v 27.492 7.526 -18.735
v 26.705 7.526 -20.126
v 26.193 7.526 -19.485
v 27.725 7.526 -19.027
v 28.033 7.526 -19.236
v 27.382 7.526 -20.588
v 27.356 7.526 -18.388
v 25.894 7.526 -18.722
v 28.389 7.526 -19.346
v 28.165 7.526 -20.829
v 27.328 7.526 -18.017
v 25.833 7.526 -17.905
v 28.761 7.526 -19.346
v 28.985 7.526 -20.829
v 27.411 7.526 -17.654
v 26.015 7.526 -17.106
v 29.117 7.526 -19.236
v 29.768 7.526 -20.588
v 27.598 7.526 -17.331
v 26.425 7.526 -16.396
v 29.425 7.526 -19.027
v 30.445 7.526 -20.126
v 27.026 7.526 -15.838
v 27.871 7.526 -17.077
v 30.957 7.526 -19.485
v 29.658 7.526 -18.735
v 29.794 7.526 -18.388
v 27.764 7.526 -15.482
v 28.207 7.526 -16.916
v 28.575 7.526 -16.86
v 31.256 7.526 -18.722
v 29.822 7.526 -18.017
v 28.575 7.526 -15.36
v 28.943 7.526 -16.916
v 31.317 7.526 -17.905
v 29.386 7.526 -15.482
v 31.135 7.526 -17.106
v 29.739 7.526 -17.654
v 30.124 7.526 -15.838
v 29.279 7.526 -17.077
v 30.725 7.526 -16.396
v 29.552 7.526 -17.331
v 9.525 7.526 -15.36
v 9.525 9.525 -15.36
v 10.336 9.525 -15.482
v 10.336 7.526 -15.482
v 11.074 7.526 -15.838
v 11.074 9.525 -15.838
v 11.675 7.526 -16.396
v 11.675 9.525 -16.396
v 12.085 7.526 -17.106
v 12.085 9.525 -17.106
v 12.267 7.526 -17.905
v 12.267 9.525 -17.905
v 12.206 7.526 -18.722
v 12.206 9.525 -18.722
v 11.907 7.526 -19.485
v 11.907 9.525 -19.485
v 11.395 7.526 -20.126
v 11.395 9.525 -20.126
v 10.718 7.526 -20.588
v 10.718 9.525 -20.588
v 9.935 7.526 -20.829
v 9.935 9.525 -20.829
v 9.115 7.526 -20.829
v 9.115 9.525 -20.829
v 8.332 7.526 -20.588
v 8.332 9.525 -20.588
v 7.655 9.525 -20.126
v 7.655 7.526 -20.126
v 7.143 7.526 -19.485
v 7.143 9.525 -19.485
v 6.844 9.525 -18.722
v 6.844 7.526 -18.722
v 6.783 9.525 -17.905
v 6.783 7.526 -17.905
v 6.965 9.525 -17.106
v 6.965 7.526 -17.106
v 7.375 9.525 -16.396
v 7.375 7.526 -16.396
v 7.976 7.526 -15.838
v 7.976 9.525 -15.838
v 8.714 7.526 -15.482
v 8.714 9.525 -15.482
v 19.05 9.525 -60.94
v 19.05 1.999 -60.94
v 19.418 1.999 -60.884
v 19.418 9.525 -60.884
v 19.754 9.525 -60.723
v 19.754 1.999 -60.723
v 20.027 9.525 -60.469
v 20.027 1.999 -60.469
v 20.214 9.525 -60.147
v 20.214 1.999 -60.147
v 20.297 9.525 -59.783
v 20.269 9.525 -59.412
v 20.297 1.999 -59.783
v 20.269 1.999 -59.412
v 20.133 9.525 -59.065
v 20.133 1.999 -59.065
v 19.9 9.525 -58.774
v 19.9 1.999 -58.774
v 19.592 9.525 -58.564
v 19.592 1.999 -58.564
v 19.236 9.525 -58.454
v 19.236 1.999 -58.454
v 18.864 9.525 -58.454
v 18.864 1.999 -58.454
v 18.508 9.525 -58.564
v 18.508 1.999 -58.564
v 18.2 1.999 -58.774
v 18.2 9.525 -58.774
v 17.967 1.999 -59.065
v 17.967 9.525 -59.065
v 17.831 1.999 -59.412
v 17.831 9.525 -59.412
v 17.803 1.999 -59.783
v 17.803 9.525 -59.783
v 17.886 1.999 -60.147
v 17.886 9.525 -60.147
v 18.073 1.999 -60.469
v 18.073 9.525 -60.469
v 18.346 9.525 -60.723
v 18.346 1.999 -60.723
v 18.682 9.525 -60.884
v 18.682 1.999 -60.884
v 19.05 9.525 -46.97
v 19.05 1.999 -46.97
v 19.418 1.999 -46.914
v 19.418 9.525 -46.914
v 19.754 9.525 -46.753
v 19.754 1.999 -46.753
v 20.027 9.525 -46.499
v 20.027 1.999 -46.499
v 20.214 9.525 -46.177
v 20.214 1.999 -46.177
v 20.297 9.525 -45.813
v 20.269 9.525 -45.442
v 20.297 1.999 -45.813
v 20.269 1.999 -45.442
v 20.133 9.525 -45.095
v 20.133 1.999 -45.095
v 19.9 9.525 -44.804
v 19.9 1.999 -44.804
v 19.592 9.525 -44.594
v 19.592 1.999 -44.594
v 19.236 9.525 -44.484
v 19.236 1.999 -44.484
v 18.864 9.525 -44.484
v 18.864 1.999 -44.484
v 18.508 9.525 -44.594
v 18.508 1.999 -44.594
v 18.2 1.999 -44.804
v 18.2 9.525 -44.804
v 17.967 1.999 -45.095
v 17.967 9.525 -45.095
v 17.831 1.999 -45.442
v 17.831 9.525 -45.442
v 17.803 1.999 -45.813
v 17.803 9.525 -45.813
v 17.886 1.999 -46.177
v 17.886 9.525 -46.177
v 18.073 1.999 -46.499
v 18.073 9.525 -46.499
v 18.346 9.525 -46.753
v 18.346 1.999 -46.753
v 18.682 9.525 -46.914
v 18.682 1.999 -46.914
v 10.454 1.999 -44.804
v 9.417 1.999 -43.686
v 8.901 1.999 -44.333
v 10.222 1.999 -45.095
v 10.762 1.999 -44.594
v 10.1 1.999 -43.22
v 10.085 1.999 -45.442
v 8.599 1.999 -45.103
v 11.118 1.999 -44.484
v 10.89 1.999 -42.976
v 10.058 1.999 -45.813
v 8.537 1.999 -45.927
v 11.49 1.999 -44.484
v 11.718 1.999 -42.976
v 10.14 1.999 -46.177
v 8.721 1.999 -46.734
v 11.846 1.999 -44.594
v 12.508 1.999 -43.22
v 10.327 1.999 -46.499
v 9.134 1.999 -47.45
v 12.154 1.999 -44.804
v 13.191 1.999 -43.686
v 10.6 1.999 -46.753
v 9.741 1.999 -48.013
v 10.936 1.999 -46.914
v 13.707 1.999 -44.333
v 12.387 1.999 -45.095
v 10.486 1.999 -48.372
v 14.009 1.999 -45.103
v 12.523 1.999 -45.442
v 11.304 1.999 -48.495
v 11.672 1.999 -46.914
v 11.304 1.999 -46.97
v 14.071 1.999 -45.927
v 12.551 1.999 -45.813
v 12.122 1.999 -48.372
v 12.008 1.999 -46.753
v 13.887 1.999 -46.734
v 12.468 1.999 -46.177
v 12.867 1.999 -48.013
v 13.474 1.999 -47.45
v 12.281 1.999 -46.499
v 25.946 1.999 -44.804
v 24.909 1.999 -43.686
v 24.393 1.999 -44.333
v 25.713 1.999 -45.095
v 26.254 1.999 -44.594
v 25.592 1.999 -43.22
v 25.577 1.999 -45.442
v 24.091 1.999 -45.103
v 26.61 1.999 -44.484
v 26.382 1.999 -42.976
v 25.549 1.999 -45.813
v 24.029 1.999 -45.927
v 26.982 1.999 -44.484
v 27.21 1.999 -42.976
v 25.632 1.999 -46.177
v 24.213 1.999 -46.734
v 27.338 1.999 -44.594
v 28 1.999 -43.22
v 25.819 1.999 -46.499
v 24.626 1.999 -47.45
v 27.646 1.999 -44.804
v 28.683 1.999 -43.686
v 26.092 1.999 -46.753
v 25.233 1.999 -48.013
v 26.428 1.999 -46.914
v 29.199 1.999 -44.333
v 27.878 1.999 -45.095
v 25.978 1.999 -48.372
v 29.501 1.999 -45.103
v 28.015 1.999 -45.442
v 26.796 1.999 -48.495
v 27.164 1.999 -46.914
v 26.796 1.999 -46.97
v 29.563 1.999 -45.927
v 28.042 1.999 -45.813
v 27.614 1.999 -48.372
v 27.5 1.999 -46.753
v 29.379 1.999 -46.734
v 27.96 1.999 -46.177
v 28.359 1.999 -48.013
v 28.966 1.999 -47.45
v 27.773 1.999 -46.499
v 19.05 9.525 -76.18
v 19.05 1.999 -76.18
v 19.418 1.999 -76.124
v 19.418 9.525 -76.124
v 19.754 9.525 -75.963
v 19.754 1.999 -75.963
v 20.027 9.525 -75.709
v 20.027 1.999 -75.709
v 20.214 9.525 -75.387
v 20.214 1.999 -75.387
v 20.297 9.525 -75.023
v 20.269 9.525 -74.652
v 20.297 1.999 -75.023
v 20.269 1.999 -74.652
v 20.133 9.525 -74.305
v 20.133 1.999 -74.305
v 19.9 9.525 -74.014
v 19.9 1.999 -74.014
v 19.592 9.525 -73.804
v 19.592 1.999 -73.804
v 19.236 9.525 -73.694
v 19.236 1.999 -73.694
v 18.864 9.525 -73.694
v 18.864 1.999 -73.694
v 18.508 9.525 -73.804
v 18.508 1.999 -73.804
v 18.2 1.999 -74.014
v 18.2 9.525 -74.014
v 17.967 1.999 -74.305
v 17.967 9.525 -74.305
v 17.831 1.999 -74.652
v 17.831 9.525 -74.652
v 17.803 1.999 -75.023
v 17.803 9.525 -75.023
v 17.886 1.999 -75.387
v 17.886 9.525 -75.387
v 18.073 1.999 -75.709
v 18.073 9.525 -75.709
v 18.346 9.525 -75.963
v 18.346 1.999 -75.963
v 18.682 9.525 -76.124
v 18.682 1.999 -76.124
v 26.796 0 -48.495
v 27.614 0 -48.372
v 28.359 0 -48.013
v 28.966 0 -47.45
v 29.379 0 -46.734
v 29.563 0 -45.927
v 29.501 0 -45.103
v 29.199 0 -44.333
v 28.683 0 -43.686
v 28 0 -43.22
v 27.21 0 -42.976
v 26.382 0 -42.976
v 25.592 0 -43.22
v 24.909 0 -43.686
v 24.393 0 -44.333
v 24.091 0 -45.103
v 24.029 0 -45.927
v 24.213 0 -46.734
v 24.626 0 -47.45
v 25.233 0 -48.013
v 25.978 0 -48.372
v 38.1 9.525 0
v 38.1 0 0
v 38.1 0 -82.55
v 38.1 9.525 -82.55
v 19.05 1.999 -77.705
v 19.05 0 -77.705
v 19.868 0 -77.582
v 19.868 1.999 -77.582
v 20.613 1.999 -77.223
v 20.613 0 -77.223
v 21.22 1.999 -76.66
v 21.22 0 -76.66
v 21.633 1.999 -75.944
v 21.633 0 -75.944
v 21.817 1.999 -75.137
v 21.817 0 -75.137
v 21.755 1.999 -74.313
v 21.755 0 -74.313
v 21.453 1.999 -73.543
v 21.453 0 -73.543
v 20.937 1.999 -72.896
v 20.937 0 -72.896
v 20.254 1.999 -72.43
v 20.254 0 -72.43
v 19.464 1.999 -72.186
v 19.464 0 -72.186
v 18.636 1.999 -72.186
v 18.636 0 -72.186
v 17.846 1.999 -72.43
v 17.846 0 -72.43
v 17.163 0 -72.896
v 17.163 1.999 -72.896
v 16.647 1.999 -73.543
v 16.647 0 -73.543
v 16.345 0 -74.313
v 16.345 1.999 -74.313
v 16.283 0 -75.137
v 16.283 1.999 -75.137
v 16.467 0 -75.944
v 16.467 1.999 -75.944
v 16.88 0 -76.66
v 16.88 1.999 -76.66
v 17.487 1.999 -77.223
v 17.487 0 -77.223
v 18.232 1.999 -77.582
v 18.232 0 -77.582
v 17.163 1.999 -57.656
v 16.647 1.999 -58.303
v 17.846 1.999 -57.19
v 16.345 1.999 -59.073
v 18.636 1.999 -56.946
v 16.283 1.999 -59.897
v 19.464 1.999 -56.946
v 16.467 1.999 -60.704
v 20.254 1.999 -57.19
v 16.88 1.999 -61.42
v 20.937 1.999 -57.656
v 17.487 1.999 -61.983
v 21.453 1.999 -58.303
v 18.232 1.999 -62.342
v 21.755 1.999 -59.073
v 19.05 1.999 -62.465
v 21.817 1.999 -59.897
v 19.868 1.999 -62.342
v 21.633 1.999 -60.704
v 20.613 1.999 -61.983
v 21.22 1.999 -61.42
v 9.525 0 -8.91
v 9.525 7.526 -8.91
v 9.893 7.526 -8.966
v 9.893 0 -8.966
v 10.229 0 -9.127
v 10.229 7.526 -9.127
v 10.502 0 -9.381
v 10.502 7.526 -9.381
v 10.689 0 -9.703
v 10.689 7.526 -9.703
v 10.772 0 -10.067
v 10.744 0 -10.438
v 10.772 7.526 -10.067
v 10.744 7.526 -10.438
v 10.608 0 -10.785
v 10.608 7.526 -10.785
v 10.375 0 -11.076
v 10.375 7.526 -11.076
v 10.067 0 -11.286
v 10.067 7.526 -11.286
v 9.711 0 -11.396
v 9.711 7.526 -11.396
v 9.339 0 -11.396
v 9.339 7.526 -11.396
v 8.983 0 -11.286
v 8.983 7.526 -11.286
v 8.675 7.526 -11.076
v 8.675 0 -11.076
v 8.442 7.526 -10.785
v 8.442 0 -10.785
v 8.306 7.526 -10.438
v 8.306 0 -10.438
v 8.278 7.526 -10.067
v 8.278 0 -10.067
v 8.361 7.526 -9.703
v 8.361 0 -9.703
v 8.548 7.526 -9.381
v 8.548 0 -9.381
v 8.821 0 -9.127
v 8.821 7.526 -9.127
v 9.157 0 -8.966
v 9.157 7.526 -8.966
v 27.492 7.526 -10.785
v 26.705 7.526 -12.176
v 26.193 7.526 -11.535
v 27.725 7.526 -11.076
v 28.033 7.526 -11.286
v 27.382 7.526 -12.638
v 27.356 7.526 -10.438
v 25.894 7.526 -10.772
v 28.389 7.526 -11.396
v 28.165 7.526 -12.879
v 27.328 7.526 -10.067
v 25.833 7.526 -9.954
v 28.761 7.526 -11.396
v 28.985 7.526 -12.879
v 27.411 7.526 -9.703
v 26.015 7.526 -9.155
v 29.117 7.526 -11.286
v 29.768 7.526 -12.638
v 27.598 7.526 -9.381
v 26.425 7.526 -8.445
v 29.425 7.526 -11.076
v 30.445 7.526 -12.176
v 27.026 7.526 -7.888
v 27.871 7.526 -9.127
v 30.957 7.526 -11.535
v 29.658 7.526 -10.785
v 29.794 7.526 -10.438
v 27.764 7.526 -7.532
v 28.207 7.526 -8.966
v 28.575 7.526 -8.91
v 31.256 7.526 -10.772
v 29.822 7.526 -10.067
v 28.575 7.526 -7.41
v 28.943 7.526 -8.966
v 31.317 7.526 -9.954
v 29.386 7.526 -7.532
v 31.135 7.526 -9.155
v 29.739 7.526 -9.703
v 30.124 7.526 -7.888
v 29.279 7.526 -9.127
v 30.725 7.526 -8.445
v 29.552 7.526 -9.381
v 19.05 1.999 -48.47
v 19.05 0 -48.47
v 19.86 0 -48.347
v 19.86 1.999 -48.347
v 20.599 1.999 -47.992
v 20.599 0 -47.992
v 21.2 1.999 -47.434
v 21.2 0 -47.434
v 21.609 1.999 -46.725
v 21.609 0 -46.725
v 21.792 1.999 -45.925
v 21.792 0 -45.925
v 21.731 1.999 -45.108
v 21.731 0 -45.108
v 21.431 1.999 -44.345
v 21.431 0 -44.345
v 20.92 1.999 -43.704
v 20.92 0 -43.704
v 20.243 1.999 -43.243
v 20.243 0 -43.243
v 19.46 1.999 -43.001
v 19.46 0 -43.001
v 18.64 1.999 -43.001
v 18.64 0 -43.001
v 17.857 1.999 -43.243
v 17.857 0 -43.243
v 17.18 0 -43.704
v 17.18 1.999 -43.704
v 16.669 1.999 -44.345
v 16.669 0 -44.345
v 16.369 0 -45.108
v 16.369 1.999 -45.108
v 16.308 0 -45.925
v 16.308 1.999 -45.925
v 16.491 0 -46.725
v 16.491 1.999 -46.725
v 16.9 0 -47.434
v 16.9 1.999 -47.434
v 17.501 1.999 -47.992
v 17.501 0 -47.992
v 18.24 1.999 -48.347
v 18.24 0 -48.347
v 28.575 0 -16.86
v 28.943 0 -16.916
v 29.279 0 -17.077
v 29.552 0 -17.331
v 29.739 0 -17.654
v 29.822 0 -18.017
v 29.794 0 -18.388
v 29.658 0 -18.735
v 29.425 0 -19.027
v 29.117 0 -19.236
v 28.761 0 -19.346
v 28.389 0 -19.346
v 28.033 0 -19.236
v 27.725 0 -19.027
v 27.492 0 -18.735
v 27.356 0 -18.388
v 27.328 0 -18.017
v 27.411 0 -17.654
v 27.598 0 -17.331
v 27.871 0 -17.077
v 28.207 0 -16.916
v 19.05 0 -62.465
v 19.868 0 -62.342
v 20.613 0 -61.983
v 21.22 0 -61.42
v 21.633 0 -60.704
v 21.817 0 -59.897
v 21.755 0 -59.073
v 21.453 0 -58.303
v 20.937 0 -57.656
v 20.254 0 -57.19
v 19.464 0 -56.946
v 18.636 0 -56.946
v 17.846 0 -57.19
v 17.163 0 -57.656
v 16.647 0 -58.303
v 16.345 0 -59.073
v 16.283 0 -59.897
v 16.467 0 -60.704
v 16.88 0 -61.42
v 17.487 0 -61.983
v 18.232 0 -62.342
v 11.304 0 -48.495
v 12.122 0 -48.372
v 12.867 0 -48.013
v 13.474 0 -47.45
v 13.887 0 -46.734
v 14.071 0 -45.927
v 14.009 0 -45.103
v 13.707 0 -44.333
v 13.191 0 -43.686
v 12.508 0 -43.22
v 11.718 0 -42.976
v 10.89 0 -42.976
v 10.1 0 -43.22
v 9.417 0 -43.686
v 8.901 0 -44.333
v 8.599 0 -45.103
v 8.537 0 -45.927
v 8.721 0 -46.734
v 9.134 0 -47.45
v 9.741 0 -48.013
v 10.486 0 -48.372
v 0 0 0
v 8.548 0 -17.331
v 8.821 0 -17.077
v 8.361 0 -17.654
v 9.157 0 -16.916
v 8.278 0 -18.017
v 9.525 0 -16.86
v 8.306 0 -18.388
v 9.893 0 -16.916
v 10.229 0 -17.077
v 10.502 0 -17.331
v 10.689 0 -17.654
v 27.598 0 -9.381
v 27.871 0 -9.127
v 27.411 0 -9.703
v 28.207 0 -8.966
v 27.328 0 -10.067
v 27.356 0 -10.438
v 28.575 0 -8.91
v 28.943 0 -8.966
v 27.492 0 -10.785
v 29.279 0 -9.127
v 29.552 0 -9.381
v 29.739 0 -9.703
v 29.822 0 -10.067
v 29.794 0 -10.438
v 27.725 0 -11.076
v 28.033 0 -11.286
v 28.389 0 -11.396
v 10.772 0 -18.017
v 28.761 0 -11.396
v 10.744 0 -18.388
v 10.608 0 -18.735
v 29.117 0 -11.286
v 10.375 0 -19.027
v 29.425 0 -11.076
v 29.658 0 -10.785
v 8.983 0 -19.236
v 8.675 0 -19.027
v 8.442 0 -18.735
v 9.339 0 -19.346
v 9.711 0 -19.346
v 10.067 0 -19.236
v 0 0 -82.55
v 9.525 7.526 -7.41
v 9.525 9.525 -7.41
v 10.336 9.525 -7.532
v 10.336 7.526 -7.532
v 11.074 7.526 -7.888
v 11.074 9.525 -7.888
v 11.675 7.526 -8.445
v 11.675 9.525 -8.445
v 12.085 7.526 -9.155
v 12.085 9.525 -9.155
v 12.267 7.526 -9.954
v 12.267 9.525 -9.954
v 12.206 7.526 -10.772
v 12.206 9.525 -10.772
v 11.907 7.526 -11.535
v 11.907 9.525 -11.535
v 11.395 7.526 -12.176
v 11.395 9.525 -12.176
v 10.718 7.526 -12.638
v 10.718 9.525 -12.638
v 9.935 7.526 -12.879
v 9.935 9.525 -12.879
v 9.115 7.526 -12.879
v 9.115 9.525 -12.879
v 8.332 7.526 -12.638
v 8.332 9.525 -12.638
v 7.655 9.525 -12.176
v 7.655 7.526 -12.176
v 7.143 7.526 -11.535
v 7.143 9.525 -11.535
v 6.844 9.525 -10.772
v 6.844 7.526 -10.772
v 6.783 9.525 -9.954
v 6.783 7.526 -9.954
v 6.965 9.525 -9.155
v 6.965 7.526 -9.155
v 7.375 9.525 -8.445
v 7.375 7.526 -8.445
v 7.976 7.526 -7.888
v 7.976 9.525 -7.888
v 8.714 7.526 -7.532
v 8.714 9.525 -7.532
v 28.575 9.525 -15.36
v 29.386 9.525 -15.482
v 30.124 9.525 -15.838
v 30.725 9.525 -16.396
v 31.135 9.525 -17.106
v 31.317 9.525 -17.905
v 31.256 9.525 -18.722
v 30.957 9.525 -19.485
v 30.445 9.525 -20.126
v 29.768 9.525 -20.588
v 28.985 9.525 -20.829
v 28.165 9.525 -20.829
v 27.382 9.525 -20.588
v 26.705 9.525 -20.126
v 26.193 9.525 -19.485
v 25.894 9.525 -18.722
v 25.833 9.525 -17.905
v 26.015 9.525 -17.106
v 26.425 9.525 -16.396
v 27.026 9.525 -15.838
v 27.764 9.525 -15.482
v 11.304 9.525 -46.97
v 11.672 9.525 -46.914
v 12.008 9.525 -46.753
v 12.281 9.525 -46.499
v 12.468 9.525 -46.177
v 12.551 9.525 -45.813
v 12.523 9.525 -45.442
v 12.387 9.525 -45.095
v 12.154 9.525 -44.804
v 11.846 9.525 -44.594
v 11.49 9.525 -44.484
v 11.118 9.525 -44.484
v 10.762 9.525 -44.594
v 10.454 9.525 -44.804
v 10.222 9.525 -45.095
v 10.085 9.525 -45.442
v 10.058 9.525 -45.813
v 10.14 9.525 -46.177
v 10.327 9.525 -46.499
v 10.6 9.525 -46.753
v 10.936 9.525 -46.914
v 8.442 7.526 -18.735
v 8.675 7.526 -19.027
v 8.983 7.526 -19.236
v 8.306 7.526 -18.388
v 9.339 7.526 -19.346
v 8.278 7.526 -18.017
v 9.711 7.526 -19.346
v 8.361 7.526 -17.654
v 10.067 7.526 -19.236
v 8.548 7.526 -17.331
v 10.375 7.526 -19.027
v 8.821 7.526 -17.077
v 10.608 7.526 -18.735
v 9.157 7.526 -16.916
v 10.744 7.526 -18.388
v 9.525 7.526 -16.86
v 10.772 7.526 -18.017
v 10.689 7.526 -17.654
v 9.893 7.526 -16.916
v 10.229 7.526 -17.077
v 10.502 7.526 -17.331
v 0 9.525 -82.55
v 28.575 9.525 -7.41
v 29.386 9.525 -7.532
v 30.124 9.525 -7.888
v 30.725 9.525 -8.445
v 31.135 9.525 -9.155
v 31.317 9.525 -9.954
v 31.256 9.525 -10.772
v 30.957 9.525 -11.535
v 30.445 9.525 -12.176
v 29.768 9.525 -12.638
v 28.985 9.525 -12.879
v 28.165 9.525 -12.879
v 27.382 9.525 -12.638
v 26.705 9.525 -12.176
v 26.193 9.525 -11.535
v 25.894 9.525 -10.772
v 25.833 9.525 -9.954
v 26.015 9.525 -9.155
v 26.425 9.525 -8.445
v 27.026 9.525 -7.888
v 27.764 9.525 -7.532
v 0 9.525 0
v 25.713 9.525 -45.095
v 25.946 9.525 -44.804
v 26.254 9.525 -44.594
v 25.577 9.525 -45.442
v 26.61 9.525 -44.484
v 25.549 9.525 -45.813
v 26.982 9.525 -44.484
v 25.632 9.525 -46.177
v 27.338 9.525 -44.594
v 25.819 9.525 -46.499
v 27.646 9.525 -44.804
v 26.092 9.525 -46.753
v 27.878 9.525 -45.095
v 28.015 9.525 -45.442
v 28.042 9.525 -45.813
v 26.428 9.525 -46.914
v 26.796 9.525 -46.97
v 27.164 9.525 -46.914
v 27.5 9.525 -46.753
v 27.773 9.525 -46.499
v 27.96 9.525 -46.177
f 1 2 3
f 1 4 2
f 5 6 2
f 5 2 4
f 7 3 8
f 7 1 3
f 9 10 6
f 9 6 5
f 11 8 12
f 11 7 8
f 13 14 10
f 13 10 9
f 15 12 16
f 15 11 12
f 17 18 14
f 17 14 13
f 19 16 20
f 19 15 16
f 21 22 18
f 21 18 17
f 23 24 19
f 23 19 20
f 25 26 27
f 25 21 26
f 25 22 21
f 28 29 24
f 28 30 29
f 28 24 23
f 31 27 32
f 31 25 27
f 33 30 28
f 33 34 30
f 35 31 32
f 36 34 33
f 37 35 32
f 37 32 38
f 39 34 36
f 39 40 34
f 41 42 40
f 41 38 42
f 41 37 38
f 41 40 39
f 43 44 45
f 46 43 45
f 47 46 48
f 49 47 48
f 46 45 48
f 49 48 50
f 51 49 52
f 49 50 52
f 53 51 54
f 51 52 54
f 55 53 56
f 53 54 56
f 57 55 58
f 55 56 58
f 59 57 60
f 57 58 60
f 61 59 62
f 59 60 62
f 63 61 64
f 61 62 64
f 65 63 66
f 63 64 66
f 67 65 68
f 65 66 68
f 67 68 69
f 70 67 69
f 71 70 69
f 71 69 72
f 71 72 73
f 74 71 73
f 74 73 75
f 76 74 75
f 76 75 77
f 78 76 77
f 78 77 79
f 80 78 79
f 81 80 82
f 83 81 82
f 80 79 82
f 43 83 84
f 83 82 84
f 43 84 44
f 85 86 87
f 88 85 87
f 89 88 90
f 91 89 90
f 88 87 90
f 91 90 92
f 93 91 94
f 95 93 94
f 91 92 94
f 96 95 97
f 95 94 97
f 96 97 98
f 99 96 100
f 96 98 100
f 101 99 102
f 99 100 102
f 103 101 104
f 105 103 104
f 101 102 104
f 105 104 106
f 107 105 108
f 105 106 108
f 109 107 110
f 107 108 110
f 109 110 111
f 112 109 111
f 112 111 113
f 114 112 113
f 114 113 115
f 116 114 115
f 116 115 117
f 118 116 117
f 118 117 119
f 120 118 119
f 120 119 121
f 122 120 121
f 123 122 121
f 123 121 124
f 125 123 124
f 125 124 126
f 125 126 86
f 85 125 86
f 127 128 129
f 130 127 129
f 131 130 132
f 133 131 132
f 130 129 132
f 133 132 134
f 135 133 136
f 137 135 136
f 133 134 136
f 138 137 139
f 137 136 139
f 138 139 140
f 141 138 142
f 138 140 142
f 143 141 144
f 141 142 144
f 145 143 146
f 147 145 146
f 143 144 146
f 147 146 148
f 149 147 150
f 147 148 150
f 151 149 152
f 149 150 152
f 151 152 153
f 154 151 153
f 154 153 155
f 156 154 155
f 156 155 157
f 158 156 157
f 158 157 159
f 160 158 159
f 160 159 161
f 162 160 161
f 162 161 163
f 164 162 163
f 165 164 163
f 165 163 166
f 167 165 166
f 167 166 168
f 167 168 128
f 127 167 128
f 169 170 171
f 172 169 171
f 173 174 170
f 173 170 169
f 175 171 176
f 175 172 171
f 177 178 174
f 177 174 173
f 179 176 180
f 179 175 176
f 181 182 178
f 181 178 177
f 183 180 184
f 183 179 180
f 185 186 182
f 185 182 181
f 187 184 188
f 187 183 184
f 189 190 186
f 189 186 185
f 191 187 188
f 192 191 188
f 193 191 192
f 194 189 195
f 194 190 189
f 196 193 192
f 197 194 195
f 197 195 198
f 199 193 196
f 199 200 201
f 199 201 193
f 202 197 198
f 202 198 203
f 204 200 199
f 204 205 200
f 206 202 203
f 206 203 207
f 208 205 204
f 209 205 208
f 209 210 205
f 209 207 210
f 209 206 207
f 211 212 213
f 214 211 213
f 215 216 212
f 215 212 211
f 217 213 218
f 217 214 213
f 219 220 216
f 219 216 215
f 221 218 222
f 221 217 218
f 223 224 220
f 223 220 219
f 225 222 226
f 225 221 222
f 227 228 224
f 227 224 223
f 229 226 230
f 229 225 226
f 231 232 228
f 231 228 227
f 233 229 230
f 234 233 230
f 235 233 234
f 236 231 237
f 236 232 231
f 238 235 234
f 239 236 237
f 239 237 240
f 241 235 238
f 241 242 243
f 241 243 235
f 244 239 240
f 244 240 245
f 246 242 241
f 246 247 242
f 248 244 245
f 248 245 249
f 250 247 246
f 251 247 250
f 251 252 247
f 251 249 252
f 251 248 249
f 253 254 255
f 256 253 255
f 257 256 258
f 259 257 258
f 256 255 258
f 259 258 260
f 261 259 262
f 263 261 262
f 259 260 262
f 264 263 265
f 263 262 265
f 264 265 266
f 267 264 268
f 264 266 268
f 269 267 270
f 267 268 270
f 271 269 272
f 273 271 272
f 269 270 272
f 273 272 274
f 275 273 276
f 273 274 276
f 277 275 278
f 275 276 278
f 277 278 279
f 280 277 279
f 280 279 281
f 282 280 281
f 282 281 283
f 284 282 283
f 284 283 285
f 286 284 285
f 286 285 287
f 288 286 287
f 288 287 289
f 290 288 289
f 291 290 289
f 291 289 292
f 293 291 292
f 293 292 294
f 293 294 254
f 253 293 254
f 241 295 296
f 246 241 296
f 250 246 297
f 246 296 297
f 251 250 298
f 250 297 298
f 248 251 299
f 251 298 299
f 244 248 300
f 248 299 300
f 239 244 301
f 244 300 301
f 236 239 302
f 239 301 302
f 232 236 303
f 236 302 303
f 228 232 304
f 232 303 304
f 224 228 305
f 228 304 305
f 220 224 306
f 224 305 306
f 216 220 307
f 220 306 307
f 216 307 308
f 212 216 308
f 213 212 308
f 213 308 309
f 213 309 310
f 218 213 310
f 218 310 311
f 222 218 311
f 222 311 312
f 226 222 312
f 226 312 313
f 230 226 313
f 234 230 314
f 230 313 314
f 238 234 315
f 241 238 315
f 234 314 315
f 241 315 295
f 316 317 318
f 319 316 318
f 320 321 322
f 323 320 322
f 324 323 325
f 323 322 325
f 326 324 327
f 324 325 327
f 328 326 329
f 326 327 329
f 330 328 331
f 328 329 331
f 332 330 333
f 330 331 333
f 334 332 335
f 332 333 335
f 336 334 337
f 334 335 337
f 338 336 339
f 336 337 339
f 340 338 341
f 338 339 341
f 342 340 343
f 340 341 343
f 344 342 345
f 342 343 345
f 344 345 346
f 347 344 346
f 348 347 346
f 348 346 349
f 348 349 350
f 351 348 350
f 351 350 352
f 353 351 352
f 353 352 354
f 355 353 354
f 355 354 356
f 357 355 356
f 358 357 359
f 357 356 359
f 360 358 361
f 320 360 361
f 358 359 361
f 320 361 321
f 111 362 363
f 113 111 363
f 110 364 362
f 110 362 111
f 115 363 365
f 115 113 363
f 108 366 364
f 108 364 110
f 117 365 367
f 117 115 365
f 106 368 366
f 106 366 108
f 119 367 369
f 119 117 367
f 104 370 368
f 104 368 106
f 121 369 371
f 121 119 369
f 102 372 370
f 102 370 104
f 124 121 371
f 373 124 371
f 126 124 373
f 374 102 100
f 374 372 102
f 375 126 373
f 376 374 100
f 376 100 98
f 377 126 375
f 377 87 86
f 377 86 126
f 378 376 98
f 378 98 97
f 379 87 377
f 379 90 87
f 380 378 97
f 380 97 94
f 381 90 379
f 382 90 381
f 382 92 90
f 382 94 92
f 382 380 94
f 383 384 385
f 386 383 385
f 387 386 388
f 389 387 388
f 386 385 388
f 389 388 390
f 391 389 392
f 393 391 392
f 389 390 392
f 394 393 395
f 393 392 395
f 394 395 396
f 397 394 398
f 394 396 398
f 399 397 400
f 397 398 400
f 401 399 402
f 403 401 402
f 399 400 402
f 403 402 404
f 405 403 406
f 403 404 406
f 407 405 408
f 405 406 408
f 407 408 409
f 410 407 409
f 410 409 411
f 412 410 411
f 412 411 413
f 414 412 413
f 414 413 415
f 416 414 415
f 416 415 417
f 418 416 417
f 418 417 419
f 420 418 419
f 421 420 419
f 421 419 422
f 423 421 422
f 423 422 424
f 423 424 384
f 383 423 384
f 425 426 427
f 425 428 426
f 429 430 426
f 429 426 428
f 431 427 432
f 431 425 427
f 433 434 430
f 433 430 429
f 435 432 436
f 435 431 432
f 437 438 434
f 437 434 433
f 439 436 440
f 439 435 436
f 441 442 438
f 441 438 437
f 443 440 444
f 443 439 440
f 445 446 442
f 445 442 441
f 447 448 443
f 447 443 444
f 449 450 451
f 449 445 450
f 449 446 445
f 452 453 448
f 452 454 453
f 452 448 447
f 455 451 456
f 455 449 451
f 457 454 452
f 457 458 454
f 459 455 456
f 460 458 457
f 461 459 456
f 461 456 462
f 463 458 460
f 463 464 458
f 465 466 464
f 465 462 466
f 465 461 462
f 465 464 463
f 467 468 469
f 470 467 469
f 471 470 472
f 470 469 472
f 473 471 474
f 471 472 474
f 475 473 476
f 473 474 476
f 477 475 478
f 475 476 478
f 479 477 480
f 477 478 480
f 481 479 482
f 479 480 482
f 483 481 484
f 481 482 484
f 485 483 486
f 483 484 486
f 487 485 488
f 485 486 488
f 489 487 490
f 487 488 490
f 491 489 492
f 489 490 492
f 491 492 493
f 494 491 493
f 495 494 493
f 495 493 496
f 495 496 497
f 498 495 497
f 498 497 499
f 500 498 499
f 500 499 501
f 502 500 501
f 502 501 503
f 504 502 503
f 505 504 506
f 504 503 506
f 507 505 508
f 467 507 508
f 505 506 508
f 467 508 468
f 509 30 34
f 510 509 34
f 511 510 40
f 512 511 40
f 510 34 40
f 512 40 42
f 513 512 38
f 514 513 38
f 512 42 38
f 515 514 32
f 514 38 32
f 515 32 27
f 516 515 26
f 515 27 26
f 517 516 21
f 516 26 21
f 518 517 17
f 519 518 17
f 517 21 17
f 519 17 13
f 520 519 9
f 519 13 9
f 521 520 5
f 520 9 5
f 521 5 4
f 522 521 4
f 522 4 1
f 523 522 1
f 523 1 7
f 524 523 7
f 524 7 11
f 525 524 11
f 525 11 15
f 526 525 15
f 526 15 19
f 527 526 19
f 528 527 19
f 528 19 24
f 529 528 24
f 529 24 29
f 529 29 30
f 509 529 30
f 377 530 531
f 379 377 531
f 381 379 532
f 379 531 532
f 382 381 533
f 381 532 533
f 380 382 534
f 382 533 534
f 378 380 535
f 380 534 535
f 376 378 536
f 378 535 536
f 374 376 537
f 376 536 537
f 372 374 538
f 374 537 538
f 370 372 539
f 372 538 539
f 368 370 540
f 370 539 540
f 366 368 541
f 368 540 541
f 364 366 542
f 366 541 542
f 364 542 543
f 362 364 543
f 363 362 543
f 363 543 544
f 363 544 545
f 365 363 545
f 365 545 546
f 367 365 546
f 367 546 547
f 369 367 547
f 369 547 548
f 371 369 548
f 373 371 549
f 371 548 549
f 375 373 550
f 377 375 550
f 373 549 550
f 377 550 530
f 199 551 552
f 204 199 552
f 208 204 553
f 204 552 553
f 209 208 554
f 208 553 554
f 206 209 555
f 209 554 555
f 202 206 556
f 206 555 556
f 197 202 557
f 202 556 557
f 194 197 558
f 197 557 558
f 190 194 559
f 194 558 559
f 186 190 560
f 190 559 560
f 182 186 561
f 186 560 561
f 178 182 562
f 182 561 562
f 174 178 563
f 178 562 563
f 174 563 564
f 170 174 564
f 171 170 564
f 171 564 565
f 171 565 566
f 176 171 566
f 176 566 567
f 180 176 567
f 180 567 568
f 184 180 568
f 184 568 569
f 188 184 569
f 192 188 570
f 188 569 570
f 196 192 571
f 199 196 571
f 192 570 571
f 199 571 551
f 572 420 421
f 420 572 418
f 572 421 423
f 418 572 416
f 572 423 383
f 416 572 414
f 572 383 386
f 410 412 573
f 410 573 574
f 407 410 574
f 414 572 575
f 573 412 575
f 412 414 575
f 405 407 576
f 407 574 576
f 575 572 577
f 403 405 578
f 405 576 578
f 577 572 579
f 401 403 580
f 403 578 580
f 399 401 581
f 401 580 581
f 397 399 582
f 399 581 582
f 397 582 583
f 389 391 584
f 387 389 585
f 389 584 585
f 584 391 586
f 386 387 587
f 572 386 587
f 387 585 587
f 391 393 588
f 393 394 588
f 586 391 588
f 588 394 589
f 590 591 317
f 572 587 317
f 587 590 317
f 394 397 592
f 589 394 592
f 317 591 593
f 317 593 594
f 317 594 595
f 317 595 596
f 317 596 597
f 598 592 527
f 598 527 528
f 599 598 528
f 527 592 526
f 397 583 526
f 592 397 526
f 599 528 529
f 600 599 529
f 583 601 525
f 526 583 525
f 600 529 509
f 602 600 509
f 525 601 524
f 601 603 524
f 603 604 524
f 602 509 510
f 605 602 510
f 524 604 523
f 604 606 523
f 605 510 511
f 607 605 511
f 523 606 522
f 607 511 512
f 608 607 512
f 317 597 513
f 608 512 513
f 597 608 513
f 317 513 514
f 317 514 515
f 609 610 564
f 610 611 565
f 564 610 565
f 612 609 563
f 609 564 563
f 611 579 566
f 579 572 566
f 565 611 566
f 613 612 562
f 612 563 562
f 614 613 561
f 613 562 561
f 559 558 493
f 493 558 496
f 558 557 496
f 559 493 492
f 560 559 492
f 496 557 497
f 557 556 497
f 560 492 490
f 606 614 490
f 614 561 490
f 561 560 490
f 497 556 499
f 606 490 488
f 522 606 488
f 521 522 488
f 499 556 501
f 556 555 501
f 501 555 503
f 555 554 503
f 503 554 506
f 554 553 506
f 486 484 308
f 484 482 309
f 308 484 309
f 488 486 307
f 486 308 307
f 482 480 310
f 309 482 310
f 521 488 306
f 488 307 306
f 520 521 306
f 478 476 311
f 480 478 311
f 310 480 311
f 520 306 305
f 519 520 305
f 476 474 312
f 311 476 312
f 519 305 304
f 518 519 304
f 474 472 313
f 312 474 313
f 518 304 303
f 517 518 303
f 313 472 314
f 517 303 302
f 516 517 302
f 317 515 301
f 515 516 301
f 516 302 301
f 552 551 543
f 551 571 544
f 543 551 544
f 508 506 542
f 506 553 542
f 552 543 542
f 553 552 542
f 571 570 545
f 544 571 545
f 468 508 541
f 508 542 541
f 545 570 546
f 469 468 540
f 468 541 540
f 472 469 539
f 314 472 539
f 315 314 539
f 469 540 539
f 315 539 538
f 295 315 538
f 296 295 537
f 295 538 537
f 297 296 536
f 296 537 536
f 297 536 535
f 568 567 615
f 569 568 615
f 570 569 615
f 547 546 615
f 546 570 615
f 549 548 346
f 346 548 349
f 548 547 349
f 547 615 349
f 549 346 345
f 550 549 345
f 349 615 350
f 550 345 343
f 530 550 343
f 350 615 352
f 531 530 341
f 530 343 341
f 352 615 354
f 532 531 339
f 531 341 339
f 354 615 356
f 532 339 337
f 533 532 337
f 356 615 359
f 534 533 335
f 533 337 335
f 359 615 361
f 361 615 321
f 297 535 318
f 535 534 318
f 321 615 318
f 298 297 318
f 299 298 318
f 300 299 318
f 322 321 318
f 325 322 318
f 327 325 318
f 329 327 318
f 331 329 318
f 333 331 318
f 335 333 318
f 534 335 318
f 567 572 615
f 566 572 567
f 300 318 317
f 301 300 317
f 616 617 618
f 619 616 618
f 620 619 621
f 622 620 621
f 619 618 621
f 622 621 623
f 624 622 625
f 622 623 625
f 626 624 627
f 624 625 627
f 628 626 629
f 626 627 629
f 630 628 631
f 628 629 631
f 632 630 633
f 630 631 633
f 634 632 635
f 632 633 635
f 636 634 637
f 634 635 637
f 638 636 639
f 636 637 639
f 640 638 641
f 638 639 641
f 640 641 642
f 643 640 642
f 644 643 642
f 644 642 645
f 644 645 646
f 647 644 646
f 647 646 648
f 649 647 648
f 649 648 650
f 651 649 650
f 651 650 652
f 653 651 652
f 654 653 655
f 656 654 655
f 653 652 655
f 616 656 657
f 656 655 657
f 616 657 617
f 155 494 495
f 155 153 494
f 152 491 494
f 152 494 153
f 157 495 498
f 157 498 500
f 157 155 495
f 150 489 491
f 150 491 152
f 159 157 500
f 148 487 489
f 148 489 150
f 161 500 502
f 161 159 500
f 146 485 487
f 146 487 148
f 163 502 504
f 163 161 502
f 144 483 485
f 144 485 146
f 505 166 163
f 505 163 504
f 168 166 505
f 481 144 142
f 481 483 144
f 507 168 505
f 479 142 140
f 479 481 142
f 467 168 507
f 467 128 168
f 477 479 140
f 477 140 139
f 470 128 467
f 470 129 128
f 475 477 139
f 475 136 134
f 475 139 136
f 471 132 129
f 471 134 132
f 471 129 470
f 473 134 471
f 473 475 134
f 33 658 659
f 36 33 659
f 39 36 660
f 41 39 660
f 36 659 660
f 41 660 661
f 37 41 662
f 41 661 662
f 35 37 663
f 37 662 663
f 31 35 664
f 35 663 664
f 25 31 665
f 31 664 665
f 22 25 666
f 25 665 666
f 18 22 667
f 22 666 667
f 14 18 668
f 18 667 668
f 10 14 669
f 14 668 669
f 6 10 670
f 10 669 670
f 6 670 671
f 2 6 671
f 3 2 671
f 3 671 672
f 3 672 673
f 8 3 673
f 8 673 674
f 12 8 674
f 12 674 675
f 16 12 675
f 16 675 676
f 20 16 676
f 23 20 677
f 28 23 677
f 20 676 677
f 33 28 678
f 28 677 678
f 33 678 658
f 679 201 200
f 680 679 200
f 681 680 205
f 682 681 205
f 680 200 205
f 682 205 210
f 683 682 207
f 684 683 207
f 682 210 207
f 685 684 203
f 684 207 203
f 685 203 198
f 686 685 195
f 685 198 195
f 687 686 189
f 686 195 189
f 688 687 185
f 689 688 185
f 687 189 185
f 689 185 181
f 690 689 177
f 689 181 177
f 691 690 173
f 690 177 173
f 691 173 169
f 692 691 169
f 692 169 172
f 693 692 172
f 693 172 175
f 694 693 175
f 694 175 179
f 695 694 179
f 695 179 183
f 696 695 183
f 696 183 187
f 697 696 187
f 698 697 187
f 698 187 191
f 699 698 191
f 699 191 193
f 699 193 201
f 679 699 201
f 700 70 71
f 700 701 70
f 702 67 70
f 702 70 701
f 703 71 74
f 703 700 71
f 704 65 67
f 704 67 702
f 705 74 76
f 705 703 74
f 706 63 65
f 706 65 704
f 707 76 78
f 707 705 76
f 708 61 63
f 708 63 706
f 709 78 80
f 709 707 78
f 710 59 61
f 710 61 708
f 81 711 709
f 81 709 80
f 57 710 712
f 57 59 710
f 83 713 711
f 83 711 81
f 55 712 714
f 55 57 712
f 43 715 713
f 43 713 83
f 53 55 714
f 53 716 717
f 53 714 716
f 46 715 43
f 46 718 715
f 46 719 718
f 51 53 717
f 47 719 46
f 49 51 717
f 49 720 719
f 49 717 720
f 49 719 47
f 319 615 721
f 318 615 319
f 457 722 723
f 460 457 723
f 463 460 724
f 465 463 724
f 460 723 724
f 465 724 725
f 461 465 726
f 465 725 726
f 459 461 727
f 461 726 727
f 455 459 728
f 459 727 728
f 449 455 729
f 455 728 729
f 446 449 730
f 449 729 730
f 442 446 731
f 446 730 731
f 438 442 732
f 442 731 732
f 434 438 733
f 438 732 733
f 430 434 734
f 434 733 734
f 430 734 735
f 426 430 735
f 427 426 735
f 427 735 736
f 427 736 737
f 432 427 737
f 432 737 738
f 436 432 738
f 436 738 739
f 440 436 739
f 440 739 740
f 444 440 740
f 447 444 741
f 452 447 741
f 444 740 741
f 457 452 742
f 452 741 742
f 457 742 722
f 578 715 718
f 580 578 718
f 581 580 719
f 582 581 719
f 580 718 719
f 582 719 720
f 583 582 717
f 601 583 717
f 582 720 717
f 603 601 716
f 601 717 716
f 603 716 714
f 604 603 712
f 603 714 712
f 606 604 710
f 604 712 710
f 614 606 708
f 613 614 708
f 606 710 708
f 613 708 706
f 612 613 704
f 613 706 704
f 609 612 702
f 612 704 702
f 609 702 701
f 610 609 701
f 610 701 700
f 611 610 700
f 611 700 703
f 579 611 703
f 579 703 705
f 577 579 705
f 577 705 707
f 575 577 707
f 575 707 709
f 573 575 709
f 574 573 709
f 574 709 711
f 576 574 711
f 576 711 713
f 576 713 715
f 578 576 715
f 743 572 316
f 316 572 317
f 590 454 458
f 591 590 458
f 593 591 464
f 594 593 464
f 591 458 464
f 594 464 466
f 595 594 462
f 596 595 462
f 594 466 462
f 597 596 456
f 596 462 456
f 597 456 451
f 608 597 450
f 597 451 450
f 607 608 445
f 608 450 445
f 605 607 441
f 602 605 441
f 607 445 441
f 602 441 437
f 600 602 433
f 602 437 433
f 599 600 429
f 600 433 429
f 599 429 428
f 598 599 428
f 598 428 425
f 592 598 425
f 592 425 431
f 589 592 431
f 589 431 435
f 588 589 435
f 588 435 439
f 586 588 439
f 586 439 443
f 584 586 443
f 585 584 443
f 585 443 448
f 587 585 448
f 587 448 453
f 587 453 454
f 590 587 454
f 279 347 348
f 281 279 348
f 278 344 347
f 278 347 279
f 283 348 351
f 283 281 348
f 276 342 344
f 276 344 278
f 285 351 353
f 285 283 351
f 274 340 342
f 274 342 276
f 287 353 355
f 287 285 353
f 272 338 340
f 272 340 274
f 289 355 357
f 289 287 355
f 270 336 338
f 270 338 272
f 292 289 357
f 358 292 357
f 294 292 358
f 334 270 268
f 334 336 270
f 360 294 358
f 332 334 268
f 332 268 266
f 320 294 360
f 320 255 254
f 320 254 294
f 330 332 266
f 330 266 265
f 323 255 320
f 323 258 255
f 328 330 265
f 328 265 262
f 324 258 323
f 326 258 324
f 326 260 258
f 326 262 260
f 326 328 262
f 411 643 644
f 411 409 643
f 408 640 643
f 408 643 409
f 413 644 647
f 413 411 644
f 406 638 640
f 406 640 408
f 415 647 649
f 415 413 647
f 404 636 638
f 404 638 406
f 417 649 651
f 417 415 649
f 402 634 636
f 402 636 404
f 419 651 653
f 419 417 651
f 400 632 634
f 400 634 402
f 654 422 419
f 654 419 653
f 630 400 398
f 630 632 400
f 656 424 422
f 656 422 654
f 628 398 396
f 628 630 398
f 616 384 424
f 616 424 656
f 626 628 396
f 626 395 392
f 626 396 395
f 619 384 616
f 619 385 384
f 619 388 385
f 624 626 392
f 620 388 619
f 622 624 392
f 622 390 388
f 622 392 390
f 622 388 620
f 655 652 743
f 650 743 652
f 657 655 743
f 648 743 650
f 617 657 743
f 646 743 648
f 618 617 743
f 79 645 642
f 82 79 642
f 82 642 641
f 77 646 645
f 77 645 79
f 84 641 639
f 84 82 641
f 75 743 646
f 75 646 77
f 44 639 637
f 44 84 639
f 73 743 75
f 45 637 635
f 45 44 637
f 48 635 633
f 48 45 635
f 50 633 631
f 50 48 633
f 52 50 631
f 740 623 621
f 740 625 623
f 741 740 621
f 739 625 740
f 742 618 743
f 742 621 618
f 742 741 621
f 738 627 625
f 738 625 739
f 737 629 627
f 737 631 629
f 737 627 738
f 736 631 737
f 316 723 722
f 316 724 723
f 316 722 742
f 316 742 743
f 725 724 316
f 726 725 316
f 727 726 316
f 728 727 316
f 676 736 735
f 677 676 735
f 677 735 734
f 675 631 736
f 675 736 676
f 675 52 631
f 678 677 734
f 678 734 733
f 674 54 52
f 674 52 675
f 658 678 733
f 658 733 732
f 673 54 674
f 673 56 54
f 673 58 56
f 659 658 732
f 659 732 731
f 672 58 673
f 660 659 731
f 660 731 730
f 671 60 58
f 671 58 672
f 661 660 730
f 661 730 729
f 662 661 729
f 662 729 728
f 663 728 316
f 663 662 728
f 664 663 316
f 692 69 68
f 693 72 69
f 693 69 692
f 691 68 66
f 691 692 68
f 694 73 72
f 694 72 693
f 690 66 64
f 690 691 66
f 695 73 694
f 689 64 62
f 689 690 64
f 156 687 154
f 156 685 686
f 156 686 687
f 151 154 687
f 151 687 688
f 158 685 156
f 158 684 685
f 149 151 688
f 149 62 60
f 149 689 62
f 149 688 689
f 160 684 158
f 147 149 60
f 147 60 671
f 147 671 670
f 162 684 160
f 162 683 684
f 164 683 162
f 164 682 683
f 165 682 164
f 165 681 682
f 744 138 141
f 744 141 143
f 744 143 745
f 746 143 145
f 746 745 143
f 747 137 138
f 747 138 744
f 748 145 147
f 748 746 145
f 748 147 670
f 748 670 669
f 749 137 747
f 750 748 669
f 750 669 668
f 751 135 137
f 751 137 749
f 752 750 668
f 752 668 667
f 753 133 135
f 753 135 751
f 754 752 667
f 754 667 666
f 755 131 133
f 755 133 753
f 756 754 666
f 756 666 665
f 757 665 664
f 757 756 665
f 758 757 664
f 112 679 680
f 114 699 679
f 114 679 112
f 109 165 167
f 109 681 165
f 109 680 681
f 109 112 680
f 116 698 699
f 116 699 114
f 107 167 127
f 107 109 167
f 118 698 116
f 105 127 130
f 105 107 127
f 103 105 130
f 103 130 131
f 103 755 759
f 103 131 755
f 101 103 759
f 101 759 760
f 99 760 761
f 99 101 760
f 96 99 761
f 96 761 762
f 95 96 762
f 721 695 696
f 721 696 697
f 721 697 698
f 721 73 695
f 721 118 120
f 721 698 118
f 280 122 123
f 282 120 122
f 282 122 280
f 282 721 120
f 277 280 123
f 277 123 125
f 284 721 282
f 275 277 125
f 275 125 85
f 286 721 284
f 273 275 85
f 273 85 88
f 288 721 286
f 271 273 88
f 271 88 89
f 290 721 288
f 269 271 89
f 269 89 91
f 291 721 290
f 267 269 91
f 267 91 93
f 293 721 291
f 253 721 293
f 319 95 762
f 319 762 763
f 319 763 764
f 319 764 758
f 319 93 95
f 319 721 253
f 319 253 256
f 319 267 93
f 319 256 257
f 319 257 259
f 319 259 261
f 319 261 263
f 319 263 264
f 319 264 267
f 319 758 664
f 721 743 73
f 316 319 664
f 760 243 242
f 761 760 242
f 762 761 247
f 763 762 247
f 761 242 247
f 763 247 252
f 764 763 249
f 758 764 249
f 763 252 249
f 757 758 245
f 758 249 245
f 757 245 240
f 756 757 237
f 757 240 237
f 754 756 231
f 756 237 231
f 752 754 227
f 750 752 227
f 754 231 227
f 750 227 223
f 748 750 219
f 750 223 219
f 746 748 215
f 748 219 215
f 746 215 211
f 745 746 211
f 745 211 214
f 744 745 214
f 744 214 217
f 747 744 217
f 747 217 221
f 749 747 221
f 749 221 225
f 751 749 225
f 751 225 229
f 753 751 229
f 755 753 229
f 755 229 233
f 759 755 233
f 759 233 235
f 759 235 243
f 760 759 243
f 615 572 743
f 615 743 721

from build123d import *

# Parameters (mm, degrees)
SKETCH1_W           = 38.1
SKETCH1_H           = 82.55
BOSS_EXTRUDE1_DEPTH = 9.525
SKETCH2_R           = 2.77495
CUT_EXTRUDE1_DEPTH  = 1.99898
SKETCH3_R           = 1.25
CUT_EXTRUDE2_DEPTH  = 92.41574331
SKETCH4_R           = 2.74955
SKETCH4_R_2         = 2.77495
CUT_EXTRUDE3_DEPTH  = 1.99898
SKETCH5_R           = 1.25
CUT_EXTRUDE4_DEPTH  = 92.41574331
SKETCH6_R           = 2.75
CUT_EXTRUDE5_DEPTH  = 1.99898
SKETCH7_R           = 1.25
CUT_EXTRUDE6_DEPTH  = 10


with BuildPart() as part:
    # Sketch1 → Boss-Extrude1 (new body)
    with BuildSketch(Plane(origin=(0, 0, 0), x_dir=(1, 0, 0), z_dir=(0, 1, 0))):
        with Locations((19.05, 41.275)):
            Rectangle(SKETCH1_W, SKETCH1_H)
    extrude(amount=BOSS_EXTRUDE1_DEPTH)

    # Sketch2 → Cut-Extrude1 (cut)
    with BuildSketch(Plane.XZ):
        with Locations(Location((19.05, -74.93, 0), (0, 0, 270))):
            Circle(SKETCH2_R)
        with Locations(Location((19.05, -59.69, 0), (0, 0, 270))):
            Circle(SKETCH2_R)
    extrude(amount=-CUT_EXTRUDE1_DEPTH, mode=Mode.SUBTRACT)

    # Sketch3 → Cut-Extrude2 (cut, through all)
    with BuildSketch(Plane.XZ):
        with Locations(Location((19.05, -74.93, 0), (0, 0, 270))):
            Circle(SKETCH3_R)
        with Locations(Location((19.05, -59.69, 0), (0, 0, 270))):
            Circle(SKETCH3_R)
    extrude(amount=-CUT_EXTRUDE2_DEPTH, mode=Mode.SUBTRACT)

    # Sketch4 → Cut-Extrude3 (cut)
    with BuildSketch(Plane.XZ):
        with Locations(Location((19.05, -45.72, 0), (0, 0, 270))):
            Circle(SKETCH4_R)
        with Locations(Location((11.30403505, -45.72, 0), (0, 0, 270))):
            Circle(SKETCH4_R_2)
        with Locations(Location((26.79596495, -45.72, 0), (0, 0, 270))):
            Circle(SKETCH4_R_2)
    extrude(amount=-CUT_EXTRUDE3_DEPTH, mode=Mode.SUBTRACT)

    # Sketch5 → Cut-Extrude4 (cut, through all)
    with BuildSketch(Plane.XZ):
        with Locations(Location((19.05, -45.72, 0), (0, 0, 270))):
            Circle(SKETCH5_R)
        with Locations(Location((26.79596495, -45.72, 0), (0, 0, 270))):
            Circle(SKETCH5_R)
        with Locations(Location((11.30403505, -45.72, 0), (0, 0, 270))):
            Circle(SKETCH5_R)
    extrude(amount=-CUT_EXTRUDE4_DEPTH, mode=Mode.SUBTRACT)

    # Sketch6 → Cut-Extrude5 (cut)
    with BuildSketch(Plane(origin=(0, 9.525, 0), x_dir=(1, 0, 0), z_dir=(0, 1, 0))):
        with Locations(Location((9.525, 18.1102, 0), (0, 0, 270))):
            Circle(SKETCH6_R)
        with Locations(Location((9.525, 10.16, 0), (0, 0, 270))):
            Circle(SKETCH6_R)
        with Locations(Location((28.575, 18.1102, 0), (0, 0, 270))):
            Circle(SKETCH6_R)
        with Locations(Location((28.575, 10.16, 0), (0, 0, 270))):
            Circle(SKETCH6_R)
    extrude(amount=-CUT_EXTRUDE5_DEPTH, mode=Mode.SUBTRACT)

    # Sketch7 → Cut-Extrude6 (cut)
    with BuildSketch(Plane(origin=(0, 9.525, 0), x_dir=(1, 0, 0), z_dir=(0, 1, 0))):
        with Locations(Location((9.525, 18.1102, 0), (0, 0, 270))):
            Circle(SKETCH7_R)
        with Locations(Location((9.525, 10.16, 0), (0, 0, 270))):
            Circle(SKETCH7_R)
        with Locations(Location((28.575, 10.16, 0), (0, 0, 270))):
            Circle(SKETCH7_R)
        with Locations(Location((28.575, 18.1102, 0), (0, 0, 270))):
            Circle(SKETCH7_R)
    extrude(amount=-CUT_EXTRUDE6_DEPTH, mode=Mode.SUBTRACT)


solid = part.part
